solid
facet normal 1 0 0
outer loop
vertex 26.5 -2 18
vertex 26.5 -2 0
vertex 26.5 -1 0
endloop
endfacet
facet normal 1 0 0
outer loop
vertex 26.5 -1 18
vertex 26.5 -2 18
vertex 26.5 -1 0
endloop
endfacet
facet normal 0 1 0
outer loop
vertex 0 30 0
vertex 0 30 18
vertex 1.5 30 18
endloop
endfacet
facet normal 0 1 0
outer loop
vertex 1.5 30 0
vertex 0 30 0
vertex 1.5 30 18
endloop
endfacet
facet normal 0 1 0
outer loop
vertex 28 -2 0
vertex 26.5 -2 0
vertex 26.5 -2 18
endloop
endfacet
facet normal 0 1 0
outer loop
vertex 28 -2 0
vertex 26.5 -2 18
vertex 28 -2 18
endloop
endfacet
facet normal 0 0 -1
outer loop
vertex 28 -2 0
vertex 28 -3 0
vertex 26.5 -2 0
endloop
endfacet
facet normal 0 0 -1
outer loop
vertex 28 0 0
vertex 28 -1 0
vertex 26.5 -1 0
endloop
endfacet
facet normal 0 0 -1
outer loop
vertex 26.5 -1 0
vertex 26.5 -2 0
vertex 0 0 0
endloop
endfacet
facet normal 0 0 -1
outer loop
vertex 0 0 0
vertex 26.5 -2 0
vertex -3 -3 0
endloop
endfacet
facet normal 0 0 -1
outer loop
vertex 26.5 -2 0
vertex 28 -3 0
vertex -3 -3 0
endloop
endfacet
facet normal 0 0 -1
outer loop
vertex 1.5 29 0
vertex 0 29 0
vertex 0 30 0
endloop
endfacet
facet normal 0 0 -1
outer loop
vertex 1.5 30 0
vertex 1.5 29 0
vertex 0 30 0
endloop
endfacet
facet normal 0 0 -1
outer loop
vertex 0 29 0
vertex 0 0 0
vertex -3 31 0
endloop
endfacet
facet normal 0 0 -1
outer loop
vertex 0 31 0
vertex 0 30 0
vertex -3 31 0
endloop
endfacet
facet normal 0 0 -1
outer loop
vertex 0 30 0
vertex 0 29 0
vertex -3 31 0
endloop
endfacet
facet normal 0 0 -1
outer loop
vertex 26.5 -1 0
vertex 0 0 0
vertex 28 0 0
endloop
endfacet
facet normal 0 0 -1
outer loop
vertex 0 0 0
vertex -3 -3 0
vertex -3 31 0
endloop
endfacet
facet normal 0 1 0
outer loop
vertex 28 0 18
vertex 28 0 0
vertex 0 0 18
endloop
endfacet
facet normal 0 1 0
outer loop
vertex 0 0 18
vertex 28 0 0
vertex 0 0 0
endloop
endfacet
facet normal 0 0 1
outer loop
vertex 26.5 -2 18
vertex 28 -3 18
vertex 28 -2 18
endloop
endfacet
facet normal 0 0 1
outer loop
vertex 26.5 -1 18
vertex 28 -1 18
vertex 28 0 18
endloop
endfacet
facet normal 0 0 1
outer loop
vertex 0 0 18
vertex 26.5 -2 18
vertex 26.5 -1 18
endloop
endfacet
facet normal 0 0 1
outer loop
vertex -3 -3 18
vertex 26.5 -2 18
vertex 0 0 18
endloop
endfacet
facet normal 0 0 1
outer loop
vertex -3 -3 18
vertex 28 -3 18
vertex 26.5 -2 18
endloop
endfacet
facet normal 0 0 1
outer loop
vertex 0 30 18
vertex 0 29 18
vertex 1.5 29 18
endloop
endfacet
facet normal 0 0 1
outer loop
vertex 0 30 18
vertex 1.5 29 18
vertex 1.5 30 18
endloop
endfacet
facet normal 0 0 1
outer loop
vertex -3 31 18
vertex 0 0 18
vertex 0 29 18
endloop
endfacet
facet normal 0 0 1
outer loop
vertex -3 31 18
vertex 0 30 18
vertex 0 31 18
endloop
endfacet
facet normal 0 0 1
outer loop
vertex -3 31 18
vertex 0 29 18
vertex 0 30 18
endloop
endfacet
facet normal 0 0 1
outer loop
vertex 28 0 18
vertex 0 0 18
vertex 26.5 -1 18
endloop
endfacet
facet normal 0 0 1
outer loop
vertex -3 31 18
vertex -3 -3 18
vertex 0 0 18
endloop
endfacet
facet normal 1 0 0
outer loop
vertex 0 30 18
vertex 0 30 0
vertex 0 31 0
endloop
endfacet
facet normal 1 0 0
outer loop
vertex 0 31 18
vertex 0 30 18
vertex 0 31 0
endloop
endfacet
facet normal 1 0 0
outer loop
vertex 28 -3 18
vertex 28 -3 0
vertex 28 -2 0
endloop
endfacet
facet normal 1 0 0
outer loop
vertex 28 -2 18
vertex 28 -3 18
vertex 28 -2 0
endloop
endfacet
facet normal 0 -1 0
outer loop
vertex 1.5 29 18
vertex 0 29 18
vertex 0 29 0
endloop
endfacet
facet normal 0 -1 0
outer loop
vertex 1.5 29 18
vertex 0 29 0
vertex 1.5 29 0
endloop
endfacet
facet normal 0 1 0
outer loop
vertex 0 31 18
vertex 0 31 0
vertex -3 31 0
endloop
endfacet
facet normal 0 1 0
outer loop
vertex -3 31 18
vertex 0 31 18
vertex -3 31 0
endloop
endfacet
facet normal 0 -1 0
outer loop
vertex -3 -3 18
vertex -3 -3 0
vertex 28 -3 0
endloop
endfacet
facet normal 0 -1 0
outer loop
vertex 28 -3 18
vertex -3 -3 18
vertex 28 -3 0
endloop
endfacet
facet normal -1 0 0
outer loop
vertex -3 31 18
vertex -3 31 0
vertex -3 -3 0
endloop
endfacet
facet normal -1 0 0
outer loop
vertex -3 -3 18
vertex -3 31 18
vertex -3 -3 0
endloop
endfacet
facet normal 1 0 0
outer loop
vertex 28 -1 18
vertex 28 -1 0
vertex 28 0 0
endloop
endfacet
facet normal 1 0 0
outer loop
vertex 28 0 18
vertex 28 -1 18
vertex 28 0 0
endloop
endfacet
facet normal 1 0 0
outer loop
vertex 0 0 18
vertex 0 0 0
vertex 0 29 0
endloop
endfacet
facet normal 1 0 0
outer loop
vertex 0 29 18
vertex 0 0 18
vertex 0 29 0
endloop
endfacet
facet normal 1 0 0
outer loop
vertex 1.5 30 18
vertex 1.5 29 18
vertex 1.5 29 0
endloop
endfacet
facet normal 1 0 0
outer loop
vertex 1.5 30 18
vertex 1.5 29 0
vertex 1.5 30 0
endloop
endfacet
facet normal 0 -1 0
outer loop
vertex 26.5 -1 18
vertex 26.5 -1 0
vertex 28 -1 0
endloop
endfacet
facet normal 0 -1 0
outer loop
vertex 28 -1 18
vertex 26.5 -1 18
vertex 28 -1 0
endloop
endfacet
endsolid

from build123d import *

# Parameters (mm, degrees)
BOSS_EXTRUDE_EQUERRE_DEPTH = 18
ESQUISSE2_W                = 3
ESQUISSE2_H                = 1
ENL_V_MAT_EXTRU_1_DEPTH    = 19
ESQUISSE3_W                = 1.5
ESQUISSE3_H                = 1
BOSS_EXTRU_1_DEPTH         = 18


with BuildPart() as part:
    # Esquisse1 → Boss_Extrude_Equerre (new body)
    with BuildSketch(Plane(origin=(0, 0, 0), x_dir=(0, 1, 0), z_dir=(0, 0, 1))):
        Polygon((0, 0), (31, 0), (31, 3), (-3, 3), (-3, 0), (-3, -28), (0, -28), align=None)
    extrude(amount=BOSS_EXTRUDE_EQUERRE_DEPTH)

    # Esquisse2 → Enlèv. mat.-Extru.1 (cut, through all)
    with BuildSketch(Plane.XY.offset(18)):
        with Locations((28, -1.5)):
            Rectangle(ESQUISSE2_W, ESQUISSE2_H)
    extrude(amount=-ENL_V_MAT_EXTRU_1_DEPTH, mode=Mode.SUBTRACT)

    # Esquisse3 → Boss.-Extru.1 (add, through all)
    with BuildSketch(Plane.XY.offset(18)):
        with Locations((0.75, 29.5)):
            Rectangle(ESQUISSE3_W, ESQUISSE3_H)
    extrude(amount=-BOSS_EXTRU_1_DEPTH)


solid = part.part
